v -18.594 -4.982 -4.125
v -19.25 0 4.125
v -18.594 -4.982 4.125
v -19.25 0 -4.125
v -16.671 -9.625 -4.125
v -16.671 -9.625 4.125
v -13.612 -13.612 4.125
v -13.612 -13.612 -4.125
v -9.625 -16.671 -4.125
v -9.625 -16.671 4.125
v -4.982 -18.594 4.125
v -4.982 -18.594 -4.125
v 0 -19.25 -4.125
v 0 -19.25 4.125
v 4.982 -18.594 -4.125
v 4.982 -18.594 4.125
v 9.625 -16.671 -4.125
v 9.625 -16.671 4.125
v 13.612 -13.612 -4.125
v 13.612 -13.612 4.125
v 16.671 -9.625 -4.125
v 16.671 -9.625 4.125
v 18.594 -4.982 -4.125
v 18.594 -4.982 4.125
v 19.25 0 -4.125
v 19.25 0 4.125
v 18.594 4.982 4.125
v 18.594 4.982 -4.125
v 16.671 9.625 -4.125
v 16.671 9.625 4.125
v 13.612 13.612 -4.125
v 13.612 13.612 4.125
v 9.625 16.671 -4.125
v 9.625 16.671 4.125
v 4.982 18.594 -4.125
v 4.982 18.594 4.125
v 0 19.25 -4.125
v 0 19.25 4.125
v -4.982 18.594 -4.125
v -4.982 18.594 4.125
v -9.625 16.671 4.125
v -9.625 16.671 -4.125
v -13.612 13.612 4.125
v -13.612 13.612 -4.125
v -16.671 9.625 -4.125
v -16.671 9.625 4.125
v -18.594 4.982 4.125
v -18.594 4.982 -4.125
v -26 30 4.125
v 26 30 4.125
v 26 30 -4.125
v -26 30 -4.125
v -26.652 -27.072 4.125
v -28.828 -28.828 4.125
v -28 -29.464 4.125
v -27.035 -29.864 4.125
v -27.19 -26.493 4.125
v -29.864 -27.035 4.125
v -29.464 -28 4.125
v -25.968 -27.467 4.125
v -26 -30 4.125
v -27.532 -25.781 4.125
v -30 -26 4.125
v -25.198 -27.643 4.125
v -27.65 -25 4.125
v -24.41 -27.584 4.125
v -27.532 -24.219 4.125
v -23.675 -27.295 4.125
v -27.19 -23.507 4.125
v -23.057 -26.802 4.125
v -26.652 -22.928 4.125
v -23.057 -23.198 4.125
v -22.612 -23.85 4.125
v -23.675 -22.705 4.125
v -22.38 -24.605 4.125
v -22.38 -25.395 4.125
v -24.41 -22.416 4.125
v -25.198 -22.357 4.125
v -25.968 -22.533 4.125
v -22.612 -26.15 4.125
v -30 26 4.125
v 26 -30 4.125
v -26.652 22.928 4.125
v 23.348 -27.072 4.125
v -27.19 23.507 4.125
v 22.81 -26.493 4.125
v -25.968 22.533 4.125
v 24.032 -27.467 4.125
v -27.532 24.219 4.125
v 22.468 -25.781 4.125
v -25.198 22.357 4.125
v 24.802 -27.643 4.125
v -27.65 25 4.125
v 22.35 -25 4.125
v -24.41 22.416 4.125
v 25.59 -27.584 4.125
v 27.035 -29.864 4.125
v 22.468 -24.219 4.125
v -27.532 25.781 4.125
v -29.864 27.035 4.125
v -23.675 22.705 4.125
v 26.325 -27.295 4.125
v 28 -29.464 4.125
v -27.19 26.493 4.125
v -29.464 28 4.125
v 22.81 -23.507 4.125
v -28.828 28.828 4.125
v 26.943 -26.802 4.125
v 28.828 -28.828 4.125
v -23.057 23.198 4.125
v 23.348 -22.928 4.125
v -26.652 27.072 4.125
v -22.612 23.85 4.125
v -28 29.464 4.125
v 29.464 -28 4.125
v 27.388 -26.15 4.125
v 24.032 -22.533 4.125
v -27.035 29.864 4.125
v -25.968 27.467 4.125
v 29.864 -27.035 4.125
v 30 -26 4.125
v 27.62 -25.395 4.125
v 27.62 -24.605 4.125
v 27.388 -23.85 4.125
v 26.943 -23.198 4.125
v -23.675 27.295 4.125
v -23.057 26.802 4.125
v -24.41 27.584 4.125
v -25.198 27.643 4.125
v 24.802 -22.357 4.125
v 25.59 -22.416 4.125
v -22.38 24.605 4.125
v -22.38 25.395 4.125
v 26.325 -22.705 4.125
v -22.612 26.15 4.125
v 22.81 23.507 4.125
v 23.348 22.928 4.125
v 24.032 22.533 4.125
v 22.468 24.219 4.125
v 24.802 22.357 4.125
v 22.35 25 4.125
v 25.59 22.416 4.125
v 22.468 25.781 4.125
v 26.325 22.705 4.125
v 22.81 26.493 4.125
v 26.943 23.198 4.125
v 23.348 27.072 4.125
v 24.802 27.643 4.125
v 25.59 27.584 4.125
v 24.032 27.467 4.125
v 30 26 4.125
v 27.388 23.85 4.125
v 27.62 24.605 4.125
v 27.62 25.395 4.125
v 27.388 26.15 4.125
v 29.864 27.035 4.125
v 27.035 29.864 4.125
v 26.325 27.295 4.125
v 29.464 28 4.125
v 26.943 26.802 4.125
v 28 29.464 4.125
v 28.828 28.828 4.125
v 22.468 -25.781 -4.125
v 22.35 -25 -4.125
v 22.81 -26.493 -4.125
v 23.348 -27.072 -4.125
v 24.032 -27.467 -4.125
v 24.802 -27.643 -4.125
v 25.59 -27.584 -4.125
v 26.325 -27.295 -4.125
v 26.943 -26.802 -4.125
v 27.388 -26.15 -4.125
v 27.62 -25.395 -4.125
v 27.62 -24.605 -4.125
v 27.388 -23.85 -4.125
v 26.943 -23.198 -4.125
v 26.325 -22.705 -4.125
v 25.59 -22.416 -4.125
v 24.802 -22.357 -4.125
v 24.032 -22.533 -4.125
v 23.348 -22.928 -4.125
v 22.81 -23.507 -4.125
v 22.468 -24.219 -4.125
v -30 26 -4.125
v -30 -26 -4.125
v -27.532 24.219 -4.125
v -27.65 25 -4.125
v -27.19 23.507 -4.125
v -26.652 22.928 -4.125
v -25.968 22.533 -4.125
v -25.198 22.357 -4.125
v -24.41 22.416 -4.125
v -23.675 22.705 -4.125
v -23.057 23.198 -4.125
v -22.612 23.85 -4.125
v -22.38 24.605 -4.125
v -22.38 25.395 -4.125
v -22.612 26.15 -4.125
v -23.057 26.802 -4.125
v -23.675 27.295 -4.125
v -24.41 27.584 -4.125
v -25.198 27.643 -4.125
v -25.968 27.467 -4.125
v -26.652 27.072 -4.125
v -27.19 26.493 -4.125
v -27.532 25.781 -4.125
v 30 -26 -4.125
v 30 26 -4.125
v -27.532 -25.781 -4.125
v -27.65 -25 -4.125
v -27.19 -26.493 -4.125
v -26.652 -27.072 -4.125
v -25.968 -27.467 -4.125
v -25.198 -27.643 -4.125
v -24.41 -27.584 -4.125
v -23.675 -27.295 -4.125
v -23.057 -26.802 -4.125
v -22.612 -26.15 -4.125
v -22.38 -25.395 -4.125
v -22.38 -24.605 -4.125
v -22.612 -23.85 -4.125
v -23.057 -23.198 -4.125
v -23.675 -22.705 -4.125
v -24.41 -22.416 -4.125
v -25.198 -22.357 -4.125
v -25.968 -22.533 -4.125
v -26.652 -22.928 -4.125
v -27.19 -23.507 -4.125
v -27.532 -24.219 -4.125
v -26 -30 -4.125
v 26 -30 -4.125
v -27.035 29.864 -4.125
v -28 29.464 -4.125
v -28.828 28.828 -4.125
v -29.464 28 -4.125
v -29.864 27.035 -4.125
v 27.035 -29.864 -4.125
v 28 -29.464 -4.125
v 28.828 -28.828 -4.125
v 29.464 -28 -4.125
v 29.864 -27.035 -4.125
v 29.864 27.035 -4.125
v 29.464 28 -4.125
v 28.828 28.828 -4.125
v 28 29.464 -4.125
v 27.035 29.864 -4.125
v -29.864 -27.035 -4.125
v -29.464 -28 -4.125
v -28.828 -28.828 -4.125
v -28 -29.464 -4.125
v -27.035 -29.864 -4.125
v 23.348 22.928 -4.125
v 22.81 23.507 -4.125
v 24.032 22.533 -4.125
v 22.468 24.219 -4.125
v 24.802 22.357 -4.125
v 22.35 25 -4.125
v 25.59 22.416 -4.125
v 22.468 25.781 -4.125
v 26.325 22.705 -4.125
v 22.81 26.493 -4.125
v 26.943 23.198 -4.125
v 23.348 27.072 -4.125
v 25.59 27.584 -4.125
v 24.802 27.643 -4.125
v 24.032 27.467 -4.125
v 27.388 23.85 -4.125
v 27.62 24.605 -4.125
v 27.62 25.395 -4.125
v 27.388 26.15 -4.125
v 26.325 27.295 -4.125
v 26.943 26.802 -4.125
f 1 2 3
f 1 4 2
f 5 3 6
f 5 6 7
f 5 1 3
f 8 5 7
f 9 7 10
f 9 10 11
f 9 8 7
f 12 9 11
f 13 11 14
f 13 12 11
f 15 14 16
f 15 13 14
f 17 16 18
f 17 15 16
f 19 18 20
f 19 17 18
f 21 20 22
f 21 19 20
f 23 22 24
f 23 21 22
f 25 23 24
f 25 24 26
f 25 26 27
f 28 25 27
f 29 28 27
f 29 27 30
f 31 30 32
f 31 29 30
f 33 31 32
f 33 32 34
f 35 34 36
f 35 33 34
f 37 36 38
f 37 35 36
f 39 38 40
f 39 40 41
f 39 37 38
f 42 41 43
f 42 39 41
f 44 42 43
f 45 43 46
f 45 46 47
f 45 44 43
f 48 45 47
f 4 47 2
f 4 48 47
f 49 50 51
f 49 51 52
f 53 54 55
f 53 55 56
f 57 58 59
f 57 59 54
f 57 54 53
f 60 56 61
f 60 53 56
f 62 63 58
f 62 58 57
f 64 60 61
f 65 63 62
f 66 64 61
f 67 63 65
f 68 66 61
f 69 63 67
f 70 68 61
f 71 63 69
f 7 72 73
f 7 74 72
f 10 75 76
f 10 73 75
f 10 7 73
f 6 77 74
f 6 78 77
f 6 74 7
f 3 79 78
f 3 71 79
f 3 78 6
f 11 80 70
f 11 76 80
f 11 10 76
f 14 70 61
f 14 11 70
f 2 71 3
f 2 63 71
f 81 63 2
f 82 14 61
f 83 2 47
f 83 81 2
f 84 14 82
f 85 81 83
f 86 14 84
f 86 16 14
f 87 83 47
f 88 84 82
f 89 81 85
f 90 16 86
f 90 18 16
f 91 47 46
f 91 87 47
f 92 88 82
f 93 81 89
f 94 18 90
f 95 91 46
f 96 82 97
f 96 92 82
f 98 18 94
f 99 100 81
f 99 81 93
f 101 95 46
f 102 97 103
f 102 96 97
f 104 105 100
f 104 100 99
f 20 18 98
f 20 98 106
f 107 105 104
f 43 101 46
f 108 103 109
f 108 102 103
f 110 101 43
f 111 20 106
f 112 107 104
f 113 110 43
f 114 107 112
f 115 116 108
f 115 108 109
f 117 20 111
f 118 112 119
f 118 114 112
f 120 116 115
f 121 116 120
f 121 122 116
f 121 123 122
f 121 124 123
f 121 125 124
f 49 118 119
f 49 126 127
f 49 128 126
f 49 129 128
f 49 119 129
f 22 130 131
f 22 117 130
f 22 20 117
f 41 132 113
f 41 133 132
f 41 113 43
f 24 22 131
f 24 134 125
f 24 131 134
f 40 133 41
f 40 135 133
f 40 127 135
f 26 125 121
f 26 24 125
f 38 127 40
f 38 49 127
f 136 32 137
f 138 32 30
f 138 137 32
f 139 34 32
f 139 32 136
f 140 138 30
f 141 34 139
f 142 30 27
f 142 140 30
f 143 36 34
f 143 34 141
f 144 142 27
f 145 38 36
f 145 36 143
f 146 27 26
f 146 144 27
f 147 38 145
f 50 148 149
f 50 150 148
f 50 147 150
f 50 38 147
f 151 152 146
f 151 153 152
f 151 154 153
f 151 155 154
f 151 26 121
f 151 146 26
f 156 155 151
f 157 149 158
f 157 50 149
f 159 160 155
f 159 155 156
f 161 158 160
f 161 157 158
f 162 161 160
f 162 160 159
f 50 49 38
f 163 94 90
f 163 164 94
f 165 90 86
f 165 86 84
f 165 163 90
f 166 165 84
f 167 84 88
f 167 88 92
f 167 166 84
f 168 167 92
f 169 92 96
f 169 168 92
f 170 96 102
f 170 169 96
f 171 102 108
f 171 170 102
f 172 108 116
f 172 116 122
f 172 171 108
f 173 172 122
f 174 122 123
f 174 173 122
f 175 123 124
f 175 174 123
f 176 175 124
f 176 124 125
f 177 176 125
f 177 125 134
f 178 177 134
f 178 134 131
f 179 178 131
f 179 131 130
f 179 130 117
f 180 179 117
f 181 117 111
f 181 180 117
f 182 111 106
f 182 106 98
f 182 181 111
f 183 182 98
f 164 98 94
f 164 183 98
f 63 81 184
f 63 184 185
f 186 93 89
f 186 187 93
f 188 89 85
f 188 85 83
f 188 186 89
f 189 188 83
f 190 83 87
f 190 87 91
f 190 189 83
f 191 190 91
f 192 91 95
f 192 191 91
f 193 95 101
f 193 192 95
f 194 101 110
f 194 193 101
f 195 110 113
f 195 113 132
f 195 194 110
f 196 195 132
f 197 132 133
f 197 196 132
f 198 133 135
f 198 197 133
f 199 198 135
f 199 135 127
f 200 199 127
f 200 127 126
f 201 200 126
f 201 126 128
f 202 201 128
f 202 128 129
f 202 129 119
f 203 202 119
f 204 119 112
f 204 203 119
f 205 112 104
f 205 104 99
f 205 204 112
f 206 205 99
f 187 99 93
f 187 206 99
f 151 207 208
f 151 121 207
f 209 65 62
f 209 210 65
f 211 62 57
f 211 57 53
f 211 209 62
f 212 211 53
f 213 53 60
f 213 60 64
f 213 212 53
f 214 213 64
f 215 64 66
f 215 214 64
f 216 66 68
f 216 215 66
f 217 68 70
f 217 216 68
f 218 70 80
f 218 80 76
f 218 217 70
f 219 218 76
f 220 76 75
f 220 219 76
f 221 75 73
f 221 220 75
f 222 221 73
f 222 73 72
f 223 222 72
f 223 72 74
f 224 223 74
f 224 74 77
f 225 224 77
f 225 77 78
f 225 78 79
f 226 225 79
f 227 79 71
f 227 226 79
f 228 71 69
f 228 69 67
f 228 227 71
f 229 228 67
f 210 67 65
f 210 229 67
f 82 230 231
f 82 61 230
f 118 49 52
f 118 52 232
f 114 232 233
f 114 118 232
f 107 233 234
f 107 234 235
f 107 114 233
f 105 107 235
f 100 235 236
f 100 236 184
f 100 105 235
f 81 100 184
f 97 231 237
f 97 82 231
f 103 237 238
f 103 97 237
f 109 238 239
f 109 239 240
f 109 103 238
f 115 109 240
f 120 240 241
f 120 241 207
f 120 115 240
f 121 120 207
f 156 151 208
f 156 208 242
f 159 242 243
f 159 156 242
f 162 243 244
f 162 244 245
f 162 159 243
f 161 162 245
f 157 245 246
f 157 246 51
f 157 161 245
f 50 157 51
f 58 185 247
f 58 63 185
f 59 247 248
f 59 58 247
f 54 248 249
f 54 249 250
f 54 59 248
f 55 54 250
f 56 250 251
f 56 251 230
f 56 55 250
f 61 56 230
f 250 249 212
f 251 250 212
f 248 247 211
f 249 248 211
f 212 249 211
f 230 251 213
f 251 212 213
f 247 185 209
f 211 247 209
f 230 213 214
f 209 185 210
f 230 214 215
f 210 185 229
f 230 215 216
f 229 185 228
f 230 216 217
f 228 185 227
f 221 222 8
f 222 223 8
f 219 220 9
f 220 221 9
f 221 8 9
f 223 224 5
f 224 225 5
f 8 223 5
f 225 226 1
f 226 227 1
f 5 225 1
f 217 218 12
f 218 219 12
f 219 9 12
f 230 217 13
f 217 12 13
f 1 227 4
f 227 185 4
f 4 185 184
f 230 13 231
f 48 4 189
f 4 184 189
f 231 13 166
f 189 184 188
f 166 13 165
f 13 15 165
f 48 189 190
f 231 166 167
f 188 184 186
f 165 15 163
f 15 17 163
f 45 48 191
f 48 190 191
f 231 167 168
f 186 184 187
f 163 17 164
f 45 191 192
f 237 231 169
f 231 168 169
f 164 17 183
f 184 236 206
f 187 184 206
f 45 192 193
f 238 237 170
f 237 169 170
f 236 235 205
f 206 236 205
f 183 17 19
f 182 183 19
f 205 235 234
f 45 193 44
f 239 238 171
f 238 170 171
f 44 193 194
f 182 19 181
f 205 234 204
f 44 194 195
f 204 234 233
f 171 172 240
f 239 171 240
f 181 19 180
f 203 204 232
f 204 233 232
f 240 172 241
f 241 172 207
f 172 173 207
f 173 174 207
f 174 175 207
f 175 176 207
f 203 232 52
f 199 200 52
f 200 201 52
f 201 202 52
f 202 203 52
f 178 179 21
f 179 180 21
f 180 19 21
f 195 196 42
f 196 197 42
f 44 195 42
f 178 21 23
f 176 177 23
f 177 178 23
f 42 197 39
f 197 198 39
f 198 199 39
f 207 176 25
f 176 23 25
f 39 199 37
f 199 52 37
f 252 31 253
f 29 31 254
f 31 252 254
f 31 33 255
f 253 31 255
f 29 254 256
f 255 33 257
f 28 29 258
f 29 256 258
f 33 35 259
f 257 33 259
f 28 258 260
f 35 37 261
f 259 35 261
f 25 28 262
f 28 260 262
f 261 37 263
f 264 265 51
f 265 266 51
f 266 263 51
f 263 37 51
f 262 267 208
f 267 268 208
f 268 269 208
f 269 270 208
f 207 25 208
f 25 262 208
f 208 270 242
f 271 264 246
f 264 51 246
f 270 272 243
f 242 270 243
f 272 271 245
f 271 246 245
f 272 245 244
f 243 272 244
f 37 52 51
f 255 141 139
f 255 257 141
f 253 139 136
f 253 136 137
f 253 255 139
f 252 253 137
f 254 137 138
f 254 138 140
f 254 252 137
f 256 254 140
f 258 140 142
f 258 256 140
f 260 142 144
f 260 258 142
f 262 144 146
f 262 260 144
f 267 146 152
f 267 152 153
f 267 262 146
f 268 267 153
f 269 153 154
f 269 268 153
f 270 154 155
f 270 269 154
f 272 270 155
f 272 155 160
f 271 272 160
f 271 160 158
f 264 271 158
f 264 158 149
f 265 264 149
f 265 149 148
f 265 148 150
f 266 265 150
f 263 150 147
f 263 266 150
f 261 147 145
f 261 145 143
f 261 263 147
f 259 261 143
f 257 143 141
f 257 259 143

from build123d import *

# Parameters (mm, degrees)
SKETCH1_R           = 19.25
SKETCH1_R_2         = 2.65
BOSS_EXTRUDE1_DEPTH = 4.125


with BuildPart() as part:
    # Sketch1 → Boss-Extrude1 (new, symmetric)
    with BuildSketch(Plane.XY):
        with BuildLine():
            Line((30, -26), (30, 26))
            ThreePointArc((30, 26), (28.828427125, 28.828427125), (26, 30))
            Line((26, 30), (-26, 30))
            ThreePointArc((-26, 30), (-28.828427125, 28.828427125), (-30, 26))
            Line((-30, 26), (-30, -26))
            ThreePointArc((-30, -26), (-28.828427125, -28.828427125), (-26, -30))
            Line((-26, -30), (26, -30))
            ThreePointArc((26, -30), (28.828427125, -28.828427125), (30, -26))
        make_face()
        with Locations(Location((0, 0, 0), (0, 0, 180))):
            Circle(SKETCH1_R, mode=Mode.SUBTRACT)
        with Locations(Location((-25, -25, 0), (0, 0, 180))):
            Circle(SKETCH1_R_2, mode=Mode.SUBTRACT)
        with Locations(Location((-25, 25, 0), (0, 0, 180))):
            Circle(SKETCH1_R_2, mode=Mode.SUBTRACT)
        with Locations(Location((25, -25, 0), (0, 0, 180))):
            Circle(SKETCH1_R_2, mode=Mode.SUBTRACT)
        with Locations(Location((25, 25, 0), (0, 0, 180))):
            Circle(SKETCH1_R_2, mode=Mode.SUBTRACT)
    extrude(amount=BOSS_EXTRUDE1_DEPTH, both=True)


solid = part.part
